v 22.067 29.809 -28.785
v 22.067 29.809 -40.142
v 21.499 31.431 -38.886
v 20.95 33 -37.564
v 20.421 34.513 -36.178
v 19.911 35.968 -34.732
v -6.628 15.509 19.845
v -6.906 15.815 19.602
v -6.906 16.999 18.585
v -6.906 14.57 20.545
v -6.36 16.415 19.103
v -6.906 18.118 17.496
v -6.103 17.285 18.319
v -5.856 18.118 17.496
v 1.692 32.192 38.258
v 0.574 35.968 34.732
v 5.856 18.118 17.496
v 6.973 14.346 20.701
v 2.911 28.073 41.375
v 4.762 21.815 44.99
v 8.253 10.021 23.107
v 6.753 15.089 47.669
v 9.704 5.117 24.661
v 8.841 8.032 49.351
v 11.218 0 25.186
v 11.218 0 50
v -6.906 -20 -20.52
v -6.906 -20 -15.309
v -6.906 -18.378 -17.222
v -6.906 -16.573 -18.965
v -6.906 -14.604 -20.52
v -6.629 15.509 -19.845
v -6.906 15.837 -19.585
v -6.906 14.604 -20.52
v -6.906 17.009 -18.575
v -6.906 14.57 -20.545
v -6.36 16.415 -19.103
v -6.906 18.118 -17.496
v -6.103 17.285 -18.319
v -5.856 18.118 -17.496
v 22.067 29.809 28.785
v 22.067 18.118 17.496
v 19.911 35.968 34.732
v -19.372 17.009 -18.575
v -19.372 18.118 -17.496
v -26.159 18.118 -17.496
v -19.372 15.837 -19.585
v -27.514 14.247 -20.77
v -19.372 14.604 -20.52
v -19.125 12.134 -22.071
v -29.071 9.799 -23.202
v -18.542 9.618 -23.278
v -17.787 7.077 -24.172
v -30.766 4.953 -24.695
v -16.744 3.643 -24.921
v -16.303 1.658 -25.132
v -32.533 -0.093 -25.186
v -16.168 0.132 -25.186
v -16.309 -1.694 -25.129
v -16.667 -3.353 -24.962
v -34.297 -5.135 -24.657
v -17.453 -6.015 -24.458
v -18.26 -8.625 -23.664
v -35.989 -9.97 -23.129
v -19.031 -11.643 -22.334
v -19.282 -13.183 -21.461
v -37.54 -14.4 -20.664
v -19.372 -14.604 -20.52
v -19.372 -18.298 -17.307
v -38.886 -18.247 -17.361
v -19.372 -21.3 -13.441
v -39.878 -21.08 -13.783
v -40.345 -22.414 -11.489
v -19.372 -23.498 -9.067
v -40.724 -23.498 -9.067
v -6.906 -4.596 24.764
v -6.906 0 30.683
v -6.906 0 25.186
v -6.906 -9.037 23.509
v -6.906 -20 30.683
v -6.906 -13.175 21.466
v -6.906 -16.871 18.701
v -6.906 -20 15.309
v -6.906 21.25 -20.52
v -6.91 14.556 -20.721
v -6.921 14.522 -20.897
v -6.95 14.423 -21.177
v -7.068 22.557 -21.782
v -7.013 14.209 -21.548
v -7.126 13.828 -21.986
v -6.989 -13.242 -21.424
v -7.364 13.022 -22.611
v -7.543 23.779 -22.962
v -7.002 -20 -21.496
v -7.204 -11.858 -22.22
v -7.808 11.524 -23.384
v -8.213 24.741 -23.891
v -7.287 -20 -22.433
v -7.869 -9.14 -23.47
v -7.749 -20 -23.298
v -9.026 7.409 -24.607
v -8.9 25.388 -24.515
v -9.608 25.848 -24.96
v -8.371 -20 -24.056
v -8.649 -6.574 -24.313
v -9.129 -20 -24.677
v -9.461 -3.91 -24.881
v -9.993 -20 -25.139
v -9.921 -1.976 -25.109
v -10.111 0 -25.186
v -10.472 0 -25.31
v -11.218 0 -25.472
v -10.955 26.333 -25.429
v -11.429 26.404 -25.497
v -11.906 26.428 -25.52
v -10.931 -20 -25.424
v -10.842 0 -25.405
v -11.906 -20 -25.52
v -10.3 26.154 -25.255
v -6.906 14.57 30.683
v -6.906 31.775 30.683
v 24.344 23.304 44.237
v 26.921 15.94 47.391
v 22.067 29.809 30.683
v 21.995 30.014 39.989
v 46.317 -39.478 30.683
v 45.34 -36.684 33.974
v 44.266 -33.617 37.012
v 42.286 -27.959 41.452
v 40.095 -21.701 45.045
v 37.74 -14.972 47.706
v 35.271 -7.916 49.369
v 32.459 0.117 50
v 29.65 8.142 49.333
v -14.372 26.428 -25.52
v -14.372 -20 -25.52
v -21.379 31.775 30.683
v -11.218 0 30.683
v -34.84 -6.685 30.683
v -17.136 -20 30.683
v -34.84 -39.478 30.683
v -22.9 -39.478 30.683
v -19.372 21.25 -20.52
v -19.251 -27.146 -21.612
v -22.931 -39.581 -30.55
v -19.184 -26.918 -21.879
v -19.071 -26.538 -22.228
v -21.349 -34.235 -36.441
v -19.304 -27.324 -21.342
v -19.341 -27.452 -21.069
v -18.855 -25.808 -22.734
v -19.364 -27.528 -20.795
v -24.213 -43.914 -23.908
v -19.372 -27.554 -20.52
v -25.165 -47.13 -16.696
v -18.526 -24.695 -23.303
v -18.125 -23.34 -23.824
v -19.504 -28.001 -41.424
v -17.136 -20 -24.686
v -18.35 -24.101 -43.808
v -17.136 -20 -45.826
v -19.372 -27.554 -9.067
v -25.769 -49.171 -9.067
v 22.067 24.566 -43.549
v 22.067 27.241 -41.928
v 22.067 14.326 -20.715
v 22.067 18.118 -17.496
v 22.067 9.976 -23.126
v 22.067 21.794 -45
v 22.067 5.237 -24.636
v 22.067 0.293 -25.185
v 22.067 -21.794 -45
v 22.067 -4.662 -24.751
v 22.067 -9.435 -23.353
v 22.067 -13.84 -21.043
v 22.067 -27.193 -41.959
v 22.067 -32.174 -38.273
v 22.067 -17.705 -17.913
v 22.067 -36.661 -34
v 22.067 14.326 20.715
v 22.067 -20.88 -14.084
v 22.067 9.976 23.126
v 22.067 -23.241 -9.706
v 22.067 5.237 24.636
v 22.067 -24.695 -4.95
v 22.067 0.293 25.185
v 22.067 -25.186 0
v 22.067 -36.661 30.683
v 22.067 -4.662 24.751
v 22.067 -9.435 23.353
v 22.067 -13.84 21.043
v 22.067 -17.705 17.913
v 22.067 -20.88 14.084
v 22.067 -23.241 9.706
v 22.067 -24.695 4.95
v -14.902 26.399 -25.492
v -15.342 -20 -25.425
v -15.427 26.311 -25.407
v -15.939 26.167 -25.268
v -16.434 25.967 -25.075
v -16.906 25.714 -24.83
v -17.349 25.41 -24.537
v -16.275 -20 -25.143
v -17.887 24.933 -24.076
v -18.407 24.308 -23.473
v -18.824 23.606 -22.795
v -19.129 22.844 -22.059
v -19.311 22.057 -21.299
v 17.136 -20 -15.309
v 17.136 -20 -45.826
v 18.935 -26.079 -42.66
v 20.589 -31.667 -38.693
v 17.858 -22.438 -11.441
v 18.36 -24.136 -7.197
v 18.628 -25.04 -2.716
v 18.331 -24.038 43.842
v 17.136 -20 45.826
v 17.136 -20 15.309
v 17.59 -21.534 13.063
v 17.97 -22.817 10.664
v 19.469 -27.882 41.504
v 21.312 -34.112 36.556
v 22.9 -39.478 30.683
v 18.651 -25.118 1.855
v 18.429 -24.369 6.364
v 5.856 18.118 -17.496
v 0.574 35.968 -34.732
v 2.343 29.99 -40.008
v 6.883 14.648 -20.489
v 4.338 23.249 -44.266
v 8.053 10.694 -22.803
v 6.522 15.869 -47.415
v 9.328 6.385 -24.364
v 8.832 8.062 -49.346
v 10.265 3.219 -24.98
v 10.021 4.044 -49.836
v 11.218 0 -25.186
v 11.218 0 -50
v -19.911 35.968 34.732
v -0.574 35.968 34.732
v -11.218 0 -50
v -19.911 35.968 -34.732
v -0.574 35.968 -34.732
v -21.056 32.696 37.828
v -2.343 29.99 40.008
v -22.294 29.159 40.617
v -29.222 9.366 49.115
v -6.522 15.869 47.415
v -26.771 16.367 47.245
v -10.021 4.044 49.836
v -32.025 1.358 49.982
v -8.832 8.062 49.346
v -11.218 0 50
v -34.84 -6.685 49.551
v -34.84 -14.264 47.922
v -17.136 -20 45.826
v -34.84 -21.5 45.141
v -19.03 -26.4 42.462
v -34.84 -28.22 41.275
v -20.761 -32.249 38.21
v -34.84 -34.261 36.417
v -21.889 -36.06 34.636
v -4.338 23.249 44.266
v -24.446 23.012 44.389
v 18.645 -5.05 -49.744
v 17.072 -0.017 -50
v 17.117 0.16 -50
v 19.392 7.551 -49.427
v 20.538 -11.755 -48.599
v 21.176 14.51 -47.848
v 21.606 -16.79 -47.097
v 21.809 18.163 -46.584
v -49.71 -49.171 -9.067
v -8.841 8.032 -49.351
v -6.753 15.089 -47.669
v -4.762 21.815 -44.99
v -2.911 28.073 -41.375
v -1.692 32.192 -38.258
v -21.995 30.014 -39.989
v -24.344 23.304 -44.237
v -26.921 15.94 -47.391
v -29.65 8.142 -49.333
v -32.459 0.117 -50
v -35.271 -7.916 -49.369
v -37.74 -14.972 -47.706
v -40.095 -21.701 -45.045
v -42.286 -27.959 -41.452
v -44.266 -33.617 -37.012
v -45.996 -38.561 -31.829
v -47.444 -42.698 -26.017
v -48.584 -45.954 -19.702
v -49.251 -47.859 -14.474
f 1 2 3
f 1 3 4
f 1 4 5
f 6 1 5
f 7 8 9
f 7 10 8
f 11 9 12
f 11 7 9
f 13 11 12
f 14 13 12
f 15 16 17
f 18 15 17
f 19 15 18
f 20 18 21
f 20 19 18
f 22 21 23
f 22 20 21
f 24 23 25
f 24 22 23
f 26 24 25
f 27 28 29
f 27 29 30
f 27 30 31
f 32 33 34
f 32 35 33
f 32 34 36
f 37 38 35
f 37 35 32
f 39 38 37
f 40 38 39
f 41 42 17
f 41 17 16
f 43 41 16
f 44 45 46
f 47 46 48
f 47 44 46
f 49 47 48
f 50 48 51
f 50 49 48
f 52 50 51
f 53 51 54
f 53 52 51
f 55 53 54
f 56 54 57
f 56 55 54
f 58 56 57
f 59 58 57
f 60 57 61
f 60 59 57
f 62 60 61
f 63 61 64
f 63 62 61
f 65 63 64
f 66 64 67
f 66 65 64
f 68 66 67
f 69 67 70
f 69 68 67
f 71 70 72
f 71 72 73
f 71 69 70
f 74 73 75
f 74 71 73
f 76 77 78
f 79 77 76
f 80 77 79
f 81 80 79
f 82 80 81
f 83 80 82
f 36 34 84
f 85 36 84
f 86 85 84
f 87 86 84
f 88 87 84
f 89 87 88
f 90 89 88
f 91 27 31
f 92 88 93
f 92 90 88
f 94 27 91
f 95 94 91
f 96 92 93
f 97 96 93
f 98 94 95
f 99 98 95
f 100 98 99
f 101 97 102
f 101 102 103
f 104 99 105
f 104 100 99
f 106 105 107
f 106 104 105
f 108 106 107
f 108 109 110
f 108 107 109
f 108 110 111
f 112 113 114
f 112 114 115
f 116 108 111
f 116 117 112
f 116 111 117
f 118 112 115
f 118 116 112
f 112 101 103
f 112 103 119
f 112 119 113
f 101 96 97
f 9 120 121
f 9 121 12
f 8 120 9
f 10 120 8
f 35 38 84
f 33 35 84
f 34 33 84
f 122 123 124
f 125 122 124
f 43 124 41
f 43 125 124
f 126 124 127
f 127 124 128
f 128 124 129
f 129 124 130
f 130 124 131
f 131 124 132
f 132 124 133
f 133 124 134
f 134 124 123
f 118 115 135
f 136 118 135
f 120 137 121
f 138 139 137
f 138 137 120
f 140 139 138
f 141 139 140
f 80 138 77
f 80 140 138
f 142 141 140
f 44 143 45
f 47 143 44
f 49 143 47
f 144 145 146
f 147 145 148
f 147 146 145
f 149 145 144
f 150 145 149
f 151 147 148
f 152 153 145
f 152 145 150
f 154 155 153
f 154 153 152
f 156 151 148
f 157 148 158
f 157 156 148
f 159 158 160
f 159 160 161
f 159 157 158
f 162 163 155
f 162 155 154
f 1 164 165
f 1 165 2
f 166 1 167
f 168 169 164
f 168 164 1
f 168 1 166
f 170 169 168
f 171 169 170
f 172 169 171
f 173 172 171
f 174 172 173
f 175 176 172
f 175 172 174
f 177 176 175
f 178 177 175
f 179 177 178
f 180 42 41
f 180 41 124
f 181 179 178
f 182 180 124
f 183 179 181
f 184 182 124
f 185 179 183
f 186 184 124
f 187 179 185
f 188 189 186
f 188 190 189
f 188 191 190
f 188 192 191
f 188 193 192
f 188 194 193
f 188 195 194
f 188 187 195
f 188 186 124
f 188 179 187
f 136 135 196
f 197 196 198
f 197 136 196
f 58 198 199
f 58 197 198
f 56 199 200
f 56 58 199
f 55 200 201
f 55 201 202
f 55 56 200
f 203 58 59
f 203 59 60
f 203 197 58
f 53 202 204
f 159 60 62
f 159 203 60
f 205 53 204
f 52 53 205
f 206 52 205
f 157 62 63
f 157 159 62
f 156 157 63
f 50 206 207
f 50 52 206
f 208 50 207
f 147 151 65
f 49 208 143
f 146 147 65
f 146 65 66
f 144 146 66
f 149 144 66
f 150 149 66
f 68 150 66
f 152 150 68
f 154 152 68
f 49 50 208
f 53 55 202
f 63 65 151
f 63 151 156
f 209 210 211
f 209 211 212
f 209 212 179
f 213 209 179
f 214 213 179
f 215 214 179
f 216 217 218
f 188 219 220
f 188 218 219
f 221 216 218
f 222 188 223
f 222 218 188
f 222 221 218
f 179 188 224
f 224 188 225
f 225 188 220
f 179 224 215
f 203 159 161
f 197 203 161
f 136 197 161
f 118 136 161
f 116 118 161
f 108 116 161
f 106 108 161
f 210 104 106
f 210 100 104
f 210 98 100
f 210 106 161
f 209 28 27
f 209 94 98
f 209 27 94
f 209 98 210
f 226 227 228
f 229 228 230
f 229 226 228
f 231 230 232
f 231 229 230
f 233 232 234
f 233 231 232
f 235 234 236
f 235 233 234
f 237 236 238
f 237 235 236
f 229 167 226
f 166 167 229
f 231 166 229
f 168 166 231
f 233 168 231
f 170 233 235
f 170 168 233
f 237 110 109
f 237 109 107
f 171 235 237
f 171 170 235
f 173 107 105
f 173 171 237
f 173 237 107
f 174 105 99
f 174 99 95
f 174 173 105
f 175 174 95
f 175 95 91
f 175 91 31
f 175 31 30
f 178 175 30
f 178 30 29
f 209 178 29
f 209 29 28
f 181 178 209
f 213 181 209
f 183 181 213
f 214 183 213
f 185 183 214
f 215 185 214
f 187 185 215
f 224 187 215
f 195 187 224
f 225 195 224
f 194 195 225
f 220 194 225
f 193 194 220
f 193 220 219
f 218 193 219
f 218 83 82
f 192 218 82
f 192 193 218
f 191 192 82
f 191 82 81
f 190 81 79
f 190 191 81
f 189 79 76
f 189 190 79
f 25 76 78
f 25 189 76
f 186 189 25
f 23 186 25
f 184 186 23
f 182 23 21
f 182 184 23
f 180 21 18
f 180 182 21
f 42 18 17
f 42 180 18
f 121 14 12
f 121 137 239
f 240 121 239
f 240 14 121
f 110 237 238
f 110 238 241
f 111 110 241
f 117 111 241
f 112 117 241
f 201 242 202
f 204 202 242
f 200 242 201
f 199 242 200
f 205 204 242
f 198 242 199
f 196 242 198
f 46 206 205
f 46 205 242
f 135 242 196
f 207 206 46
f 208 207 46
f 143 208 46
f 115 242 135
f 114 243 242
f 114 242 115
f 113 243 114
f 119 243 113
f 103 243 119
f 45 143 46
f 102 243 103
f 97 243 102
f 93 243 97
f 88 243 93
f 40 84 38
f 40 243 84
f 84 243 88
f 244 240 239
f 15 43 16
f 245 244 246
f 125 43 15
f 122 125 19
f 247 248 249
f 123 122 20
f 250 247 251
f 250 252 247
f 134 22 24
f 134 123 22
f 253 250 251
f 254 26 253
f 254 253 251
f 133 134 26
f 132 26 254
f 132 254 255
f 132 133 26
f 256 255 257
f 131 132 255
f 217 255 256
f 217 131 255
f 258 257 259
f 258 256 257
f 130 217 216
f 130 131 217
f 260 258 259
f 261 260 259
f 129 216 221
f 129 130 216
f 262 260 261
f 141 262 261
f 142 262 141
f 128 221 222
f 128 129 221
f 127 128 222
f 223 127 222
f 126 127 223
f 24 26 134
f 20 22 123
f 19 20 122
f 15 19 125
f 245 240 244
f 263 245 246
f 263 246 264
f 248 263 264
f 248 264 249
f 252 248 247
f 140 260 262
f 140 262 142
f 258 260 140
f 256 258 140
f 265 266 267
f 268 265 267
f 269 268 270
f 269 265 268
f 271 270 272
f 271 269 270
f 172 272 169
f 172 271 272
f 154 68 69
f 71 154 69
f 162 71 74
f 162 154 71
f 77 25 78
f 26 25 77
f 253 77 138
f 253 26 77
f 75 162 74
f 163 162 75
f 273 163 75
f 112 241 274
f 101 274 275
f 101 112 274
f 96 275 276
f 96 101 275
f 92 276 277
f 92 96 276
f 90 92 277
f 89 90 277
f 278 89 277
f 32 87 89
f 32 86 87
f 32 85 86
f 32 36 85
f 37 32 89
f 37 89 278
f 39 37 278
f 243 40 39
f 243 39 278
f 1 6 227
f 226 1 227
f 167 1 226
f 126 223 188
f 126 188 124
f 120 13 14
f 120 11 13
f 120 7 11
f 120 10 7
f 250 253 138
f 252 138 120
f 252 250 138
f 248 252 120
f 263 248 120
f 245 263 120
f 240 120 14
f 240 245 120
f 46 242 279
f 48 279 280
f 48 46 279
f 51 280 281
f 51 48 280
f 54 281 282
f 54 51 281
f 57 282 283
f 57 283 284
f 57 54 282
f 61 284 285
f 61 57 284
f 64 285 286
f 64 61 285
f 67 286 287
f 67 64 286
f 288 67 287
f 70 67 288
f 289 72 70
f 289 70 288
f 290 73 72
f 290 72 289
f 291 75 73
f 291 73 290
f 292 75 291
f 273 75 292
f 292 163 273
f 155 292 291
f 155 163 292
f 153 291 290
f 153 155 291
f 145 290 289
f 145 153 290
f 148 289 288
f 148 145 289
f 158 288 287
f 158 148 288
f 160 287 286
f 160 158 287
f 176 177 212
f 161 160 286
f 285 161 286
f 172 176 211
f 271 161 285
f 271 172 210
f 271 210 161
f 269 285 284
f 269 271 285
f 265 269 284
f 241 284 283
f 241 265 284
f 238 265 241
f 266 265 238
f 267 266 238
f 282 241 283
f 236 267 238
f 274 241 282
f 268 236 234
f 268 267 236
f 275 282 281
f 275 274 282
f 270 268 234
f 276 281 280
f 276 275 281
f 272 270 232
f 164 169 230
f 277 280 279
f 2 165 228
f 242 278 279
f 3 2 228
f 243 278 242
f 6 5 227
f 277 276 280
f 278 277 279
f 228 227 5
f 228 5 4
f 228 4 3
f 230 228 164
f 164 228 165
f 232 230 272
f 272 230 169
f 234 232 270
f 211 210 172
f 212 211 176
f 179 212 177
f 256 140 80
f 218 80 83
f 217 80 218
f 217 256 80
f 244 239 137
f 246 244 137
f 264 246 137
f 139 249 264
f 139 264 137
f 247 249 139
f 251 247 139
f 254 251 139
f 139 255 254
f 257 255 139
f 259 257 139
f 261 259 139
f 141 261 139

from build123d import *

# Parameters (mm, degrees)
F3_DEPTH = 50
F4_DEPTH = 50
F5_DEPTH = 50


with BuildPart() as f3:
    # F0 (on Top) → F3 (new body, symmetric)
    with BuildSketch(Plane.XY):
        Polygon((15, 50), (0, 50), (-15, 50), (-50, -50), (-26.013944, -50), (-17.136321, -20), (17.136321, -20), (26.013944, -50), (50, -50), align=None)
        Polygon((-11.217906, 0), (0, 37.90848), (11.217906, 0), align=None, mode=Mode.SUBTRACT)
    extrude(amount=F3_DEPTH, both=True)

    # F1 (on Front) → F4 (intersect, symmetric)
    with BuildSketch(Plane.XZ):
        with BuildLine():
            Line((50, 30.683344), (50, 50))
            Line((50, 50), (-34.83974, 50))
            Line((-34.83974, 50), (-34.83974, 30.683344))
            Line((-34.83974, 30.683344), (-6.906417, 30.683344))
            Line((-6.906417, 30.683344), (-6.906417, -20.520055))
            ThreePointArc((-6.906417, -20.520055), (-8.370883, -24.055589), (-11.906417, -25.520055))
            Line((-11.906417, -25.520055), (-14.371657, -25.520055))
            ThreePointArc((-14.371657, -25.520055), (-17.907191, -24.055589), (-19.371657, -20.520055))
            Line((-19.371657, -20.520055), (-19.371657, -9.06684))
            Line((-19.371657, -9.06684), (-50, -9.06684))
            Line((-50, -9.06684), (-50, -45))
            ThreePointArc((-50, -45), (-48.535534, -48.535534), (-45, -50))
            Line((-45, -50), (17.066677, -50))
            ThreePointArc((17.066677, -50), (20.602211, -48.535534), (22.066677, -45))
            Line((22.066677, -45), (22.066677, 30.683344))
            Line((22.066677, 30.683344), (50, 30.683344))
        make_face()
    extrude(amount=F4_DEPTH, both=True, mode=Mode.INTERSECT)

    # F2 (on Right) → F5 (intersect, symmetric)
    with BuildSketch(Plane.YZ):
        with BuildLine():
            Line((18.11799, 17.495545), (35.967778, 34.732102))
            ThreePointArc((35.967778, 34.732102), (-50, 0), (35.967778, -34.732102))
            Line((35.967778, -34.732102), (18.11799, -17.495545))
            ThreePointArc((18.11799, -17.495545), (-25.186418, 0), (18.11799, 17.495545))
        make_face()
    extrude(amount=F5_DEPTH, both=True, mode=Mode.INTERSECT)


solid = f3.part
